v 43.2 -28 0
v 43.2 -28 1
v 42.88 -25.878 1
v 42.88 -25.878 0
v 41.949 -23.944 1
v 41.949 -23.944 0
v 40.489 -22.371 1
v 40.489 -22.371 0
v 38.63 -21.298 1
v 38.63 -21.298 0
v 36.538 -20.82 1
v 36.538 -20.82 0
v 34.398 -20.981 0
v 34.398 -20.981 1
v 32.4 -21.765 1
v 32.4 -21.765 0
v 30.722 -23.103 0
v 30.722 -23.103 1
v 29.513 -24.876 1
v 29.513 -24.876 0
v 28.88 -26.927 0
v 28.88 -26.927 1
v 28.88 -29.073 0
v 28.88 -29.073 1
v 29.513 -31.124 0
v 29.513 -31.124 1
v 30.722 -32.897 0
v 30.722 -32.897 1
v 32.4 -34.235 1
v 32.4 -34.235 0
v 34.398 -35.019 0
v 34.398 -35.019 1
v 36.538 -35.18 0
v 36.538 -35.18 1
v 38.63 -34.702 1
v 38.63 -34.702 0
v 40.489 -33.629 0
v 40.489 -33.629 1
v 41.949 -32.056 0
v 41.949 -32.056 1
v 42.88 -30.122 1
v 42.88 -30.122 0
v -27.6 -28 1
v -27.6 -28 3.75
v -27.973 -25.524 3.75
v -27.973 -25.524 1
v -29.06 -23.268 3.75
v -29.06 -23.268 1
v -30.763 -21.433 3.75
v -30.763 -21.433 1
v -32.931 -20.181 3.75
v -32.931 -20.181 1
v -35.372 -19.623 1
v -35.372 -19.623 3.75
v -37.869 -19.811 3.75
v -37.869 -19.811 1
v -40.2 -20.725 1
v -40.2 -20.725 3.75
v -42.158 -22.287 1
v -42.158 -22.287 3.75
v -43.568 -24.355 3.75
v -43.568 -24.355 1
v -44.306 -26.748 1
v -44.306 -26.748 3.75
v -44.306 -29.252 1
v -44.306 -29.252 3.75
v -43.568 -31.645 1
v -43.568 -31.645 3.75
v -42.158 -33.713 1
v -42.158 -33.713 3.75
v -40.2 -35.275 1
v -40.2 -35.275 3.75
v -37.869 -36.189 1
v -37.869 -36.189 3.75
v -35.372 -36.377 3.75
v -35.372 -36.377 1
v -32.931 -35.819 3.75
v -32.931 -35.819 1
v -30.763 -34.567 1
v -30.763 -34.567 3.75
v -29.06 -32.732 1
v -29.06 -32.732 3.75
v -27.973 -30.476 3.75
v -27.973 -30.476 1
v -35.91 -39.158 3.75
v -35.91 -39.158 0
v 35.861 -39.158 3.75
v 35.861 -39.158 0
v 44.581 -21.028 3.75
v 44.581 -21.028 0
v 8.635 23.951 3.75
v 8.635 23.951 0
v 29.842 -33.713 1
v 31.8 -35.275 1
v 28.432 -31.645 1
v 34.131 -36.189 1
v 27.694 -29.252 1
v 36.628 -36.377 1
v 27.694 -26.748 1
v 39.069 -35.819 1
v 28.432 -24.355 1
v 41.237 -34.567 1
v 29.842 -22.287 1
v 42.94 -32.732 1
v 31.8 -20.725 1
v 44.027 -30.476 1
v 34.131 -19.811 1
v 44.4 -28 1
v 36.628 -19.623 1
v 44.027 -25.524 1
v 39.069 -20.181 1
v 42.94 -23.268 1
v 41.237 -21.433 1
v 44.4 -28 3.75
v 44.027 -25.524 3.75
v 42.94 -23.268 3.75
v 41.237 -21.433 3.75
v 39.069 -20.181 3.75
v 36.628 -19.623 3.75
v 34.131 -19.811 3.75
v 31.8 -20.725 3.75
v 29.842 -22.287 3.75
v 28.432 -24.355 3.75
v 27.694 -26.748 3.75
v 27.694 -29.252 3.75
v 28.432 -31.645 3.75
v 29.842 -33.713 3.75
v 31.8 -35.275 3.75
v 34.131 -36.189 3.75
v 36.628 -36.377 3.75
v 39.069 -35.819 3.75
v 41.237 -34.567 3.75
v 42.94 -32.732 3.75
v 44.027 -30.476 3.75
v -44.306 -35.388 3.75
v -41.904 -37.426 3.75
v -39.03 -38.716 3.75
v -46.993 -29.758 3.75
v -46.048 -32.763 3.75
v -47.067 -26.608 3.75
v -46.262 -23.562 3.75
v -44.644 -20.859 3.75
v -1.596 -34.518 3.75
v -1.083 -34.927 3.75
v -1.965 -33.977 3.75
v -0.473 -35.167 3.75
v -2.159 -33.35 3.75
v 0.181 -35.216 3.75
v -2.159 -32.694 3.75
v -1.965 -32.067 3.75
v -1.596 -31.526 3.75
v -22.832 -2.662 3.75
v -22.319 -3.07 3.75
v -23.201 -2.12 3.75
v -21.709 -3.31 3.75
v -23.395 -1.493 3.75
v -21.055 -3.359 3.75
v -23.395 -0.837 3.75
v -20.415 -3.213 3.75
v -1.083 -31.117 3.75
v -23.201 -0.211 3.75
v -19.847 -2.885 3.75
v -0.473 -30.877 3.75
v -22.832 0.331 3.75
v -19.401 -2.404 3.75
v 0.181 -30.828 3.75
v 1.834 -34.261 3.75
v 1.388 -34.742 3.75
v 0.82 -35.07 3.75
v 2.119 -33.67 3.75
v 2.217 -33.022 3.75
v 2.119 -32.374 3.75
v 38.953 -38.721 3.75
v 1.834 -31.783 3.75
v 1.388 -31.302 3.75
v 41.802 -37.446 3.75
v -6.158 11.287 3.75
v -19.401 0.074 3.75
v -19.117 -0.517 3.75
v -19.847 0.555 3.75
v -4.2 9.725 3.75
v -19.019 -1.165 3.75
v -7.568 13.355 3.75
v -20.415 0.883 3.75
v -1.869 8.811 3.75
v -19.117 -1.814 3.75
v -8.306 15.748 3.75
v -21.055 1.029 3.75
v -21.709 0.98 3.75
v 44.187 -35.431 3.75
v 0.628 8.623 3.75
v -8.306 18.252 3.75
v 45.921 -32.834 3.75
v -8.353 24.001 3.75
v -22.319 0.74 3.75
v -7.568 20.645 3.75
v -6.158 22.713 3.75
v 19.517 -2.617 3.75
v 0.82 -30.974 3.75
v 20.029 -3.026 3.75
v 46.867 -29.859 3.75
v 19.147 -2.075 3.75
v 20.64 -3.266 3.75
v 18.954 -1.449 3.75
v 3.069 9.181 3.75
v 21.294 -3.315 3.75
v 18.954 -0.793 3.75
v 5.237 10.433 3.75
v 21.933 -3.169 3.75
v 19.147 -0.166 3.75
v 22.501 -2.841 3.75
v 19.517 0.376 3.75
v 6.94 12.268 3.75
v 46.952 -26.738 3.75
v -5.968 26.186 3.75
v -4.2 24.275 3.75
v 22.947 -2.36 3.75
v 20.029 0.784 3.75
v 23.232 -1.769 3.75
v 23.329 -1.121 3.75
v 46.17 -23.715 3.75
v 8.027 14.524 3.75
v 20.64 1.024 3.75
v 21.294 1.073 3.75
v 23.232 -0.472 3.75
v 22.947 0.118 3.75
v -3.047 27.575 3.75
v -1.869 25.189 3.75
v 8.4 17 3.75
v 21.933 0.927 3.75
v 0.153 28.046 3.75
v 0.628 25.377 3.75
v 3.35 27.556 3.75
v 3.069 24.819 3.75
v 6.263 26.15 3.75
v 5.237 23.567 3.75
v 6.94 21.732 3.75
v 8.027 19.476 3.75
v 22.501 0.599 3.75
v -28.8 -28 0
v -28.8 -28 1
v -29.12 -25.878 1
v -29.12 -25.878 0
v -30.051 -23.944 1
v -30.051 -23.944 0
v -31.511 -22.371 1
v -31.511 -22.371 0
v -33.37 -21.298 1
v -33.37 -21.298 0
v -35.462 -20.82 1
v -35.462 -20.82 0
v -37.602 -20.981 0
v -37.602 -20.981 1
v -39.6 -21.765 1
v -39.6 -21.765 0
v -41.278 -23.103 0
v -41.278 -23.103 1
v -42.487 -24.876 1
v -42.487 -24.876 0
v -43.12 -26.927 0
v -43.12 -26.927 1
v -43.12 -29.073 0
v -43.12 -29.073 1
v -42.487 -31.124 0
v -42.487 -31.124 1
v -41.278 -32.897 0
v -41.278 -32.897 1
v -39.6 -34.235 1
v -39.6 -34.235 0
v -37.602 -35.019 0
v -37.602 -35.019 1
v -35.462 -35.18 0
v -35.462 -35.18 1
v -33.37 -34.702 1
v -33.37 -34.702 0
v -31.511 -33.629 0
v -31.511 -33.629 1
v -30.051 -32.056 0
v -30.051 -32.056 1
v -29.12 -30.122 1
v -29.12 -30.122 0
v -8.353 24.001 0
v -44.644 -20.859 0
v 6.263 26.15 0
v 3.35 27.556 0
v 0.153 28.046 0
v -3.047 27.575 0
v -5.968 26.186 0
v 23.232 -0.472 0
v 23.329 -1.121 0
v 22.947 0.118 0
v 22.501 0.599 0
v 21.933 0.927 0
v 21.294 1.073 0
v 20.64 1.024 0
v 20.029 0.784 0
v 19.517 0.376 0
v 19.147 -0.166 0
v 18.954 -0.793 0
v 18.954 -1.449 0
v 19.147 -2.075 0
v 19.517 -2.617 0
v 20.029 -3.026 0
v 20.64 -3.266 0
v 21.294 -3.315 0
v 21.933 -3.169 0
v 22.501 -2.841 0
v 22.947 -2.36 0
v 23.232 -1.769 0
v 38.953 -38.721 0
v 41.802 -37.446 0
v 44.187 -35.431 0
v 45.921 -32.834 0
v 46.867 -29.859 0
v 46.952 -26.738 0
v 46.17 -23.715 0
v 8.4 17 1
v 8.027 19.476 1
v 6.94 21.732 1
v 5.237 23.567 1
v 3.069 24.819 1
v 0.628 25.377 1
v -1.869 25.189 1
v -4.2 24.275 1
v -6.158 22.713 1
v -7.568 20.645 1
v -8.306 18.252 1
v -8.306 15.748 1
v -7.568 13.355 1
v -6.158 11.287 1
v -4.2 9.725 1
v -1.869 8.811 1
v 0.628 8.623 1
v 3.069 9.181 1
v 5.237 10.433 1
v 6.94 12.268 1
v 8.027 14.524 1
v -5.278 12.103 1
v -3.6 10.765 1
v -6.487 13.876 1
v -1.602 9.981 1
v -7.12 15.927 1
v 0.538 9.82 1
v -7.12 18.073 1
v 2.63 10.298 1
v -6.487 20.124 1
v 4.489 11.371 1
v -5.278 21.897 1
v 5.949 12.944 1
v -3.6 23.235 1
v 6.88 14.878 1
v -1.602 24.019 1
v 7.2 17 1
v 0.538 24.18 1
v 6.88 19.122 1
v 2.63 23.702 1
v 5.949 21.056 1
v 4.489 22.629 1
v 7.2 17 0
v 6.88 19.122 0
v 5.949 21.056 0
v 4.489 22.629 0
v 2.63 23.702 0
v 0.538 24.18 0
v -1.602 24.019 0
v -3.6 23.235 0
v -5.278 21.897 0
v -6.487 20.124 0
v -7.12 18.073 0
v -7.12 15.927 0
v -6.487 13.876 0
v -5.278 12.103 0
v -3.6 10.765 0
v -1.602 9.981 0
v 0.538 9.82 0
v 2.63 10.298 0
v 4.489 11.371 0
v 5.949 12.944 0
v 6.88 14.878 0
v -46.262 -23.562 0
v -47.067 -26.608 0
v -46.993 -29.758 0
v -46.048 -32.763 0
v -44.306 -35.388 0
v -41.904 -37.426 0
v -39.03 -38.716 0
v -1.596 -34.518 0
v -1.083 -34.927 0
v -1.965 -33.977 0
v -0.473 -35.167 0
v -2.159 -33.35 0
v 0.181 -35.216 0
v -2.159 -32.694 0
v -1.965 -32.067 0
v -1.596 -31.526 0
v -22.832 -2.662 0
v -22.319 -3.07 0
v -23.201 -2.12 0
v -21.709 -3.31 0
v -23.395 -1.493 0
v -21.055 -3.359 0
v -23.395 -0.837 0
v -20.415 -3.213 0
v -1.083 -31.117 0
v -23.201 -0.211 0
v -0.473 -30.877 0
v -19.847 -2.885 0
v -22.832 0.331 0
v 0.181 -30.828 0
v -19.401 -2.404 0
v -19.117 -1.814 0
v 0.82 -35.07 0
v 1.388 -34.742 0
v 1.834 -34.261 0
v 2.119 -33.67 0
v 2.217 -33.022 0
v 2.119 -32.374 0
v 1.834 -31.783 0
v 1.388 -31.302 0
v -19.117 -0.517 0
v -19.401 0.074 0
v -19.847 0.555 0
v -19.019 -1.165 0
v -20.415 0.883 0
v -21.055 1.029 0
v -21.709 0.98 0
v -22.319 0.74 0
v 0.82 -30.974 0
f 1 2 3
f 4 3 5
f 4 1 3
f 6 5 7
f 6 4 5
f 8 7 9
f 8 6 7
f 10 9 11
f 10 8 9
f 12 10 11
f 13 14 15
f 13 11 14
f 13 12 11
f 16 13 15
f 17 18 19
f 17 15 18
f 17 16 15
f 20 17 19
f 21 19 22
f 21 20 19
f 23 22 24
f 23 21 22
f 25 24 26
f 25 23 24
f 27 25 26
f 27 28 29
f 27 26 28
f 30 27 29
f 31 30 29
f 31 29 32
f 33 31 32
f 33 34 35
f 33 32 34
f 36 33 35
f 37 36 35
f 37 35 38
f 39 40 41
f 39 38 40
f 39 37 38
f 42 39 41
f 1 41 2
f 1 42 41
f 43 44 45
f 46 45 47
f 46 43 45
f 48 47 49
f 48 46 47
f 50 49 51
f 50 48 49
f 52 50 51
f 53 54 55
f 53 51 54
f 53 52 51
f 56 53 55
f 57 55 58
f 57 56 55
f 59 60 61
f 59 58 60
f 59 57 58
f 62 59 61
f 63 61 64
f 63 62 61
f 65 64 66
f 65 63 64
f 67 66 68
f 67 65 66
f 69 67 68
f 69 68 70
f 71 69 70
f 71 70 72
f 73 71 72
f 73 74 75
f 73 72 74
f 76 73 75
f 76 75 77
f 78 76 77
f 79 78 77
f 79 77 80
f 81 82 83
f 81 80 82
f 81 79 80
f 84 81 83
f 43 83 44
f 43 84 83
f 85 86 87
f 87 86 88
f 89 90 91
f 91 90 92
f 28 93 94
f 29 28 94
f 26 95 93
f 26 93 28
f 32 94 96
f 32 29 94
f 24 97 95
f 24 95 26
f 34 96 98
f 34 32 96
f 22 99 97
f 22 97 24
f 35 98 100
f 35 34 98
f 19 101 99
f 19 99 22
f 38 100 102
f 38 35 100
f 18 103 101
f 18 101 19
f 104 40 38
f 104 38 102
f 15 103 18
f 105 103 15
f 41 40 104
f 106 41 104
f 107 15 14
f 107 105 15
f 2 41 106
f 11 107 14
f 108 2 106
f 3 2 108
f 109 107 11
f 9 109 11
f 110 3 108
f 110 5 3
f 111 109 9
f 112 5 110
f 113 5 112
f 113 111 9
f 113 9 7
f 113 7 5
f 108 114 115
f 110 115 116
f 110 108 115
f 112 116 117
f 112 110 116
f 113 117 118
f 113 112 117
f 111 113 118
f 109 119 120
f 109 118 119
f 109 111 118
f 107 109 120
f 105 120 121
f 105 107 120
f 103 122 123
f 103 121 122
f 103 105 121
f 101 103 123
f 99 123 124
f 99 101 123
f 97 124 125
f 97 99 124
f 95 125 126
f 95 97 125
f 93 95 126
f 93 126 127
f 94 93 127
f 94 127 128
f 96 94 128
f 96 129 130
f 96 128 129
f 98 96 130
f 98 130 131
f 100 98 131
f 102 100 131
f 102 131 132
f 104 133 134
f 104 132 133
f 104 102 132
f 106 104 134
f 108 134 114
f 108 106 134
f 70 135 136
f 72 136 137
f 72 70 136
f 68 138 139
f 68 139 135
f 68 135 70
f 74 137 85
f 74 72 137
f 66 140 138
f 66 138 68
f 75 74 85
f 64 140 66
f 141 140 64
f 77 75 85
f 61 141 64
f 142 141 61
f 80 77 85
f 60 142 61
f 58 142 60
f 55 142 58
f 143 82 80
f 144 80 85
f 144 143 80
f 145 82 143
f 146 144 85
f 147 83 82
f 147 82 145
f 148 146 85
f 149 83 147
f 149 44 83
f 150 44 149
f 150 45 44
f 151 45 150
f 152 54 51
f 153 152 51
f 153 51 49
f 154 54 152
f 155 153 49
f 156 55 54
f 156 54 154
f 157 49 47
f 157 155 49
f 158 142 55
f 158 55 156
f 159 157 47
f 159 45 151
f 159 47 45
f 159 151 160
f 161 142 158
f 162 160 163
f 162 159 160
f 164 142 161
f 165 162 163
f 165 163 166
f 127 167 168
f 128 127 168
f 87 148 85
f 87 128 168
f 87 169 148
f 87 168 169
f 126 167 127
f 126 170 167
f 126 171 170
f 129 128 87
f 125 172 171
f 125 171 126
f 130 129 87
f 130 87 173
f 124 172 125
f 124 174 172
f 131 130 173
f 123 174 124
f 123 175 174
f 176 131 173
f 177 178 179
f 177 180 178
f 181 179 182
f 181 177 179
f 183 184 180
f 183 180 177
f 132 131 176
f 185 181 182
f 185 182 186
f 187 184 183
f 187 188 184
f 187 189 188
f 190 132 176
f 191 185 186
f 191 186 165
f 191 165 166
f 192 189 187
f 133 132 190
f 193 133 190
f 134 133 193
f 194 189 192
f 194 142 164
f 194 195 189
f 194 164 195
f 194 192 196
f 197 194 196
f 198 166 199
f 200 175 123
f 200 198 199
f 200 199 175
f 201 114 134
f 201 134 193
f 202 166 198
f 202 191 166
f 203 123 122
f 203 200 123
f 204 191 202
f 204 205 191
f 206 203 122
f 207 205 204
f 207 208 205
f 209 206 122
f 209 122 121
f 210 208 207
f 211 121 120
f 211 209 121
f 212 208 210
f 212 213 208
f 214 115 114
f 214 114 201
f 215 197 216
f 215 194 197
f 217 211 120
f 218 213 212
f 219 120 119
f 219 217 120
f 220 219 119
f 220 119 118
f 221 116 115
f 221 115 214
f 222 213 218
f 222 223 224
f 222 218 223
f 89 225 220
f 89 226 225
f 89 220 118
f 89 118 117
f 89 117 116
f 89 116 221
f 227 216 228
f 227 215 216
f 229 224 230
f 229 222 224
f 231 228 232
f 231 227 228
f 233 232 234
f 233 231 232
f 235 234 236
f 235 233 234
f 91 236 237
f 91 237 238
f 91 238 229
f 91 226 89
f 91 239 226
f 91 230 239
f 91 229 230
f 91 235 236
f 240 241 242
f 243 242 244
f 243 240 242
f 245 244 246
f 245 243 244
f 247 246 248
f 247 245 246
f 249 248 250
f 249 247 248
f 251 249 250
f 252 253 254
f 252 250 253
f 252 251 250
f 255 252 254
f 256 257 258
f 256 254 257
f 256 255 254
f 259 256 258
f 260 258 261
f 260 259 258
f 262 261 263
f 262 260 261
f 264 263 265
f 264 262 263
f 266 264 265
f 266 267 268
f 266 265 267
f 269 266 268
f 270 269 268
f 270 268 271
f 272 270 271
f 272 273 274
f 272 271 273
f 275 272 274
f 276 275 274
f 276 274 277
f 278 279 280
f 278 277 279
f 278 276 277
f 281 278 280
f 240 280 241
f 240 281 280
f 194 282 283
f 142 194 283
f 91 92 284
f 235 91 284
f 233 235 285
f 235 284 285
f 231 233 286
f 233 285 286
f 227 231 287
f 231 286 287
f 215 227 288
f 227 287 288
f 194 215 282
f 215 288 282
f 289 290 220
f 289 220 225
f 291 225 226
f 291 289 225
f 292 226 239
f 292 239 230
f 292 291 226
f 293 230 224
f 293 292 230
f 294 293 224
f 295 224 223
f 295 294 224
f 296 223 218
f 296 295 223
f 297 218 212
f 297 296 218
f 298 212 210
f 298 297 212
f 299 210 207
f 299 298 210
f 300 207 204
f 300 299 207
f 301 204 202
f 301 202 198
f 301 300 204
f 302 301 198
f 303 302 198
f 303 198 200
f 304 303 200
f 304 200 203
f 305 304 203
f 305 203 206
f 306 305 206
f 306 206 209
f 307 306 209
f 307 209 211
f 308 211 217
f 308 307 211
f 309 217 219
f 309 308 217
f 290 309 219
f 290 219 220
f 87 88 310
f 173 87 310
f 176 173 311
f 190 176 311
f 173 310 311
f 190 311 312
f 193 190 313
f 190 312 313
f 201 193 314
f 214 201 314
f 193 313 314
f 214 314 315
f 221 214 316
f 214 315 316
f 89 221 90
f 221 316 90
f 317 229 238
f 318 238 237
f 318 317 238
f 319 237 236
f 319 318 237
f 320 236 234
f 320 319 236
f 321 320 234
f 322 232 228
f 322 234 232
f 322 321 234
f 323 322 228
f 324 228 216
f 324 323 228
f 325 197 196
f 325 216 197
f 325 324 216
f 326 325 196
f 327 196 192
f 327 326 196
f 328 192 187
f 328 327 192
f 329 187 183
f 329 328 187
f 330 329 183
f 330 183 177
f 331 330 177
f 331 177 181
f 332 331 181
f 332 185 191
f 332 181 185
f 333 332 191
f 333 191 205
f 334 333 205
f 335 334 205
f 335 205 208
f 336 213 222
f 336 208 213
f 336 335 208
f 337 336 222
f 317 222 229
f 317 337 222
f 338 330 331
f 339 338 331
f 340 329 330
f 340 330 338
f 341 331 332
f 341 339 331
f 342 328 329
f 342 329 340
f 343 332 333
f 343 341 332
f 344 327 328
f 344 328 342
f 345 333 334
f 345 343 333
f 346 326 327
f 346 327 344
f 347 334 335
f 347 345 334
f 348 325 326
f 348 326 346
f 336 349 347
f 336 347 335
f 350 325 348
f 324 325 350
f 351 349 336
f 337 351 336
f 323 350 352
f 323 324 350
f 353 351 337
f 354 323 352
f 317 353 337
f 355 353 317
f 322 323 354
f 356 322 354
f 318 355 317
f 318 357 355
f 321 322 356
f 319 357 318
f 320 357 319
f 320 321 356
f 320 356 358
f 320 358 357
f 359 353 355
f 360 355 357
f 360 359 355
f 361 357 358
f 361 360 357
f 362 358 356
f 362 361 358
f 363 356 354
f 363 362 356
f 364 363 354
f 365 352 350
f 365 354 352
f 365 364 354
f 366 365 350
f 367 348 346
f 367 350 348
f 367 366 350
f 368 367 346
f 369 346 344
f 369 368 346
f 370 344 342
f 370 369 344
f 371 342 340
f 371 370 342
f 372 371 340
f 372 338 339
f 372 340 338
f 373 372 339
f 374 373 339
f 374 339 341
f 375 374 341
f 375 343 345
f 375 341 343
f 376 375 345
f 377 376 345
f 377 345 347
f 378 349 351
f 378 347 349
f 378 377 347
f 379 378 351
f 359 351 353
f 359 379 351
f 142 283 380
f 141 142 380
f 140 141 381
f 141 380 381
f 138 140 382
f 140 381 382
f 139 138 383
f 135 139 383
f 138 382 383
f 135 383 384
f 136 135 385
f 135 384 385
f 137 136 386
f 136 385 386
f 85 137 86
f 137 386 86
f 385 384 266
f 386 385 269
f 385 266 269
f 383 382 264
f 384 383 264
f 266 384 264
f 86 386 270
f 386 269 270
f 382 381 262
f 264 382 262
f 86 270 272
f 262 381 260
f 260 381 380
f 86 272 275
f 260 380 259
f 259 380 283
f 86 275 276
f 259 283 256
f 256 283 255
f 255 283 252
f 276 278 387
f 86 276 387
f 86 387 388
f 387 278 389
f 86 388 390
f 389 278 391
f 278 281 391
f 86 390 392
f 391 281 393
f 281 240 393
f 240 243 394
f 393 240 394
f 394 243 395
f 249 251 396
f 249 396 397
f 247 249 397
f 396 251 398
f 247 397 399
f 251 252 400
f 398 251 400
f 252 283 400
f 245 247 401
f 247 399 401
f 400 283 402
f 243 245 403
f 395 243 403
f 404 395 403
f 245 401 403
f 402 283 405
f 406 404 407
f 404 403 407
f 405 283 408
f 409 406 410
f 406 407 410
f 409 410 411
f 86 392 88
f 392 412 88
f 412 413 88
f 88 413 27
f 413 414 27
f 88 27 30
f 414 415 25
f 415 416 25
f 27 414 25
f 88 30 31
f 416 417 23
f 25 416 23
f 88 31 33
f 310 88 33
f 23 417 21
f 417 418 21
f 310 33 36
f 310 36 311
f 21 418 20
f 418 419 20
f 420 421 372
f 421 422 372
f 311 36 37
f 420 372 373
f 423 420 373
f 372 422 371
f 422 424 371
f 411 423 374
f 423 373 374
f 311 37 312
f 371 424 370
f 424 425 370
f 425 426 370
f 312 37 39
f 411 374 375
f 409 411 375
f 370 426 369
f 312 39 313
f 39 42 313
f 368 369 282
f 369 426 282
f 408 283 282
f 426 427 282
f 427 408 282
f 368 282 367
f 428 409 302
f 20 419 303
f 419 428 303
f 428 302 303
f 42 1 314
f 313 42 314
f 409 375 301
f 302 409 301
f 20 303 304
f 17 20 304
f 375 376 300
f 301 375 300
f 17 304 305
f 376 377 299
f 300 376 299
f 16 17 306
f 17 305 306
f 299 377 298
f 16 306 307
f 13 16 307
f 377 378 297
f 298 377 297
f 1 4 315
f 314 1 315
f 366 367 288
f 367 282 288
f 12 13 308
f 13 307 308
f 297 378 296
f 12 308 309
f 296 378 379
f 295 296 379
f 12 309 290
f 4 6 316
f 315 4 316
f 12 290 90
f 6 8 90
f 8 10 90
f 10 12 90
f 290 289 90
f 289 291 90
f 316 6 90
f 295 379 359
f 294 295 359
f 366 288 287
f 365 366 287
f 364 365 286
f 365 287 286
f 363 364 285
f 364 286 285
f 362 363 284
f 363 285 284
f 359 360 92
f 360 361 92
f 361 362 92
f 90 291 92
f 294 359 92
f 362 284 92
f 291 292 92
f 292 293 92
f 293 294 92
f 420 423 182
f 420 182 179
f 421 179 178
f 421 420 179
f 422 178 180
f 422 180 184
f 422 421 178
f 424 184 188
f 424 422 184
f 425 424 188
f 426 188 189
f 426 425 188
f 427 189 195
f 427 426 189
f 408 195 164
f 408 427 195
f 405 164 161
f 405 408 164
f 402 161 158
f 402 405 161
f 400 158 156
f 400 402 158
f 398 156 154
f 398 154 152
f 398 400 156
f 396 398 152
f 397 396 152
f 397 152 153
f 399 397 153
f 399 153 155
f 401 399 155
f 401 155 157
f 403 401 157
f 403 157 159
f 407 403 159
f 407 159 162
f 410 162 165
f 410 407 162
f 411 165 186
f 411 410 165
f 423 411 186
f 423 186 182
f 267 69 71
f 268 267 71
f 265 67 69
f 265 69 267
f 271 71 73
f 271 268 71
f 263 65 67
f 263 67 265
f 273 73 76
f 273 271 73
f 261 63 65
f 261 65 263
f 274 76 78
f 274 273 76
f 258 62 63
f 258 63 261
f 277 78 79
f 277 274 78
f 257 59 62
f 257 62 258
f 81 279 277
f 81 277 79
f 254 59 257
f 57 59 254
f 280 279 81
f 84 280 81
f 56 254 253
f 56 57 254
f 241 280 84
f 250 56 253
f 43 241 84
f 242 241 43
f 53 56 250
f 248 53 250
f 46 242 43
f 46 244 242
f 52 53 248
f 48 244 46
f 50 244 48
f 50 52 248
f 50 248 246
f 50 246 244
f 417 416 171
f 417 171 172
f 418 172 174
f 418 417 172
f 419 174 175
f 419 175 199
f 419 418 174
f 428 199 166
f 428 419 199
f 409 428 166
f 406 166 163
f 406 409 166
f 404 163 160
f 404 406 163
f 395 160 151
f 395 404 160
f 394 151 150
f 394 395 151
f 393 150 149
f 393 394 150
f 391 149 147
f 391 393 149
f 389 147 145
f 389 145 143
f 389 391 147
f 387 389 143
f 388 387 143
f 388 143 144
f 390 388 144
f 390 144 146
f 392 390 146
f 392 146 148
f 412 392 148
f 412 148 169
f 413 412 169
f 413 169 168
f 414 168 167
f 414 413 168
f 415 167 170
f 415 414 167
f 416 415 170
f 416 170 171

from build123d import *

# Parameters (mm, degrees)
CYLINDER001_R     = 8.4
CYLINDER001_DEPTH = 5.5
CYLINDER004_R     = 7.2
CYLINDER004_DEPTH = 6.5
CYLINDER003_R     = 10.4
CYLINDER003_DEPTH = 1
CYLINDER002_R     = 10.4
CYLINDER002_DEPTH = 2.75
SKETCH013_R       = 9.6
SKETCH013_R_2     = 2.2
PAD011_DEPTH      = 3.75


with BuildPart() as bearing_holder_extract:
    # Cylinder001 → Cylinder001 (new body)
    with BuildSketch(Plane.XY):
        Circle(CYLINDER001_R)
    extrude(amount=CYLINDER001_DEPTH)


with BuildPart() as bearing_holder_extract_fusion:
    # Cylinder004 → Cylinder004 (new body)
    with BuildSketch(Plane.XY.offset(-1)):
        Circle(CYLINDER004_R)
    extrude(amount=CYLINDER004_DEPTH)

    # Fusion001: union bearing holder extract
    add(bearing_holder_extract.part)


with BuildPart() as bearing_holder_disk:
    # Cylinder003 → Cylinder003 (new body)
    with BuildSketch(Plane.XY.offset(-1)):
        Circle(CYLINDER003_R)
    extrude(amount=CYLINDER003_DEPTH)


with BuildPart() as bearing_holder_body:
    # Cylinder002 → Cylinder002 (new body)
    with BuildSketch(Plane.XY):
        Circle(CYLINDER002_R)
    extrude(amount=CYLINDER002_DEPTH)

    # Fusion002: union bearing holder disk
    add(bearing_holder_disk.part)

    # Cut003: cut bearing holder extract fusion
    add(bearing_holder_extract_fusion.part, mode=Mode.SUBTRACT)


with BuildPart() as bearing_holder_body_1:
    # Cut003 placement: moved
    add(bearing_holder_body.part.moved(Location((0, 0, 1))))


with BuildPart() as bearing_holder_body_clone:
    # Body009 base: copy of bearing holder body
    add(bearing_holder_body_1.part)


with BuildPart() as bearing_holder_body_clone_1:
    # Clone002 placement: moved
    add(bearing_holder_body_clone.part.moved(Location((0, 0, -1))))


with BuildPart() as bearing_holder_body_clone_2:
    # Body009 placement: moved
    add(bearing_holder_body_clone_1.part.moved(Location((10, 25, 1))))


with BuildPart() as bearing_holder_body_clone001:
    # Body010 base: copy of bearing holder body
    add(bearing_holder_body_1.part)


with BuildPart() as bearing_holder_body_clone001_1:
    # Clone003 placement: moved
    add(bearing_holder_body_clone001.part.moved(Location((0, 0, -1))))


with BuildPart() as bearing_holder_body_clone001_2:
    # Body010 placement: moved
    add(bearing_holder_body_clone001_1.part.moved(Location((-26, -20, 1))))


with BuildPart() as bearing_holder_body_clone002:
    # Body011 base: copy of bearing holder body
    add(bearing_holder_body_1.part)


with BuildPart() as bearing_holder_body_clone002_1:
    # Clone004 placement: moved
    add(bearing_holder_body_clone002.part.moved(Location((0, 0, -1))))


with BuildPart() as bearing_holder_body_clone002_2:
    # Body011 placement: moved
    add(bearing_holder_body_clone002_1.part.moved(Location((46, -20, 1))))


with BuildPart() as top_bearing_plate_fusion_clone:
    # Sketch013 → Pad011 (new body)
    with BuildSketch(Plane.XY):
        with BuildLine():
            Line((1.646601, 32.001411), (-34.644004, -12.858892))
            ThreePointArc((-34.644004, -12.858892), (-36.048496, -24.763041), (-25.91021, -31.158079))
            Line((-25.91021, -31.158079), (45.861431, -31.158079))
            ThreePointArc((45.861431, -31.158079), (55.920577, -24.833853), (54.581009, -13.027591))
            Line((54.581009, -13.027591), (18.635324, 31.950884))
            ThreePointArc((18.635324, 31.950884), (10.153066, 36.045837), (1.646601, 32.001411))
        make_face()
        with Locations((-25.91021, -19.924263)):
            Circle(SKETCH013_R, mode=Mode.SUBTRACT)
        with Locations((10.120649, 25.146166)):
            Circle(SKETCH013_R, mode=Mode.SUBTRACT)
        with Locations((45.861431, -19.996062)):
            Circle(SKETCH013_R, mode=Mode.SUBTRACT)
        with Locations((-11.219142, 6.834813)):
            Circle(SKETCH013_R_2, mode=Mode.SUBTRACT)
        with Locations((10.016696, -25.022005)):
            Circle(SKETCH013_R_2, mode=Mode.SUBTRACT)
        with Locations((31.129337, 6.879182)):
            Circle(SKETCH013_R_2, mode=Mode.SUBTRACT)
    extrude(amount=PAD011_DEPTH)

    # Fusion003: union bearing holder body clone, bearing holder body clone001, bearing holder body clone002
    add(bearing_holder_body_clone_2.part)
    add(bearing_holder_body_clone001_2.part)
    add(bearing_holder_body_clone002_2.part)


with BuildPart() as top_bearing_plate_fusion_clone_1:
    # Body021 placement: moved
    add(top_bearing_plate_fusion_clone.part.moved(Location((-10, -8, 0))))


solid = top_bearing_plate_fusion_clone_1.part
